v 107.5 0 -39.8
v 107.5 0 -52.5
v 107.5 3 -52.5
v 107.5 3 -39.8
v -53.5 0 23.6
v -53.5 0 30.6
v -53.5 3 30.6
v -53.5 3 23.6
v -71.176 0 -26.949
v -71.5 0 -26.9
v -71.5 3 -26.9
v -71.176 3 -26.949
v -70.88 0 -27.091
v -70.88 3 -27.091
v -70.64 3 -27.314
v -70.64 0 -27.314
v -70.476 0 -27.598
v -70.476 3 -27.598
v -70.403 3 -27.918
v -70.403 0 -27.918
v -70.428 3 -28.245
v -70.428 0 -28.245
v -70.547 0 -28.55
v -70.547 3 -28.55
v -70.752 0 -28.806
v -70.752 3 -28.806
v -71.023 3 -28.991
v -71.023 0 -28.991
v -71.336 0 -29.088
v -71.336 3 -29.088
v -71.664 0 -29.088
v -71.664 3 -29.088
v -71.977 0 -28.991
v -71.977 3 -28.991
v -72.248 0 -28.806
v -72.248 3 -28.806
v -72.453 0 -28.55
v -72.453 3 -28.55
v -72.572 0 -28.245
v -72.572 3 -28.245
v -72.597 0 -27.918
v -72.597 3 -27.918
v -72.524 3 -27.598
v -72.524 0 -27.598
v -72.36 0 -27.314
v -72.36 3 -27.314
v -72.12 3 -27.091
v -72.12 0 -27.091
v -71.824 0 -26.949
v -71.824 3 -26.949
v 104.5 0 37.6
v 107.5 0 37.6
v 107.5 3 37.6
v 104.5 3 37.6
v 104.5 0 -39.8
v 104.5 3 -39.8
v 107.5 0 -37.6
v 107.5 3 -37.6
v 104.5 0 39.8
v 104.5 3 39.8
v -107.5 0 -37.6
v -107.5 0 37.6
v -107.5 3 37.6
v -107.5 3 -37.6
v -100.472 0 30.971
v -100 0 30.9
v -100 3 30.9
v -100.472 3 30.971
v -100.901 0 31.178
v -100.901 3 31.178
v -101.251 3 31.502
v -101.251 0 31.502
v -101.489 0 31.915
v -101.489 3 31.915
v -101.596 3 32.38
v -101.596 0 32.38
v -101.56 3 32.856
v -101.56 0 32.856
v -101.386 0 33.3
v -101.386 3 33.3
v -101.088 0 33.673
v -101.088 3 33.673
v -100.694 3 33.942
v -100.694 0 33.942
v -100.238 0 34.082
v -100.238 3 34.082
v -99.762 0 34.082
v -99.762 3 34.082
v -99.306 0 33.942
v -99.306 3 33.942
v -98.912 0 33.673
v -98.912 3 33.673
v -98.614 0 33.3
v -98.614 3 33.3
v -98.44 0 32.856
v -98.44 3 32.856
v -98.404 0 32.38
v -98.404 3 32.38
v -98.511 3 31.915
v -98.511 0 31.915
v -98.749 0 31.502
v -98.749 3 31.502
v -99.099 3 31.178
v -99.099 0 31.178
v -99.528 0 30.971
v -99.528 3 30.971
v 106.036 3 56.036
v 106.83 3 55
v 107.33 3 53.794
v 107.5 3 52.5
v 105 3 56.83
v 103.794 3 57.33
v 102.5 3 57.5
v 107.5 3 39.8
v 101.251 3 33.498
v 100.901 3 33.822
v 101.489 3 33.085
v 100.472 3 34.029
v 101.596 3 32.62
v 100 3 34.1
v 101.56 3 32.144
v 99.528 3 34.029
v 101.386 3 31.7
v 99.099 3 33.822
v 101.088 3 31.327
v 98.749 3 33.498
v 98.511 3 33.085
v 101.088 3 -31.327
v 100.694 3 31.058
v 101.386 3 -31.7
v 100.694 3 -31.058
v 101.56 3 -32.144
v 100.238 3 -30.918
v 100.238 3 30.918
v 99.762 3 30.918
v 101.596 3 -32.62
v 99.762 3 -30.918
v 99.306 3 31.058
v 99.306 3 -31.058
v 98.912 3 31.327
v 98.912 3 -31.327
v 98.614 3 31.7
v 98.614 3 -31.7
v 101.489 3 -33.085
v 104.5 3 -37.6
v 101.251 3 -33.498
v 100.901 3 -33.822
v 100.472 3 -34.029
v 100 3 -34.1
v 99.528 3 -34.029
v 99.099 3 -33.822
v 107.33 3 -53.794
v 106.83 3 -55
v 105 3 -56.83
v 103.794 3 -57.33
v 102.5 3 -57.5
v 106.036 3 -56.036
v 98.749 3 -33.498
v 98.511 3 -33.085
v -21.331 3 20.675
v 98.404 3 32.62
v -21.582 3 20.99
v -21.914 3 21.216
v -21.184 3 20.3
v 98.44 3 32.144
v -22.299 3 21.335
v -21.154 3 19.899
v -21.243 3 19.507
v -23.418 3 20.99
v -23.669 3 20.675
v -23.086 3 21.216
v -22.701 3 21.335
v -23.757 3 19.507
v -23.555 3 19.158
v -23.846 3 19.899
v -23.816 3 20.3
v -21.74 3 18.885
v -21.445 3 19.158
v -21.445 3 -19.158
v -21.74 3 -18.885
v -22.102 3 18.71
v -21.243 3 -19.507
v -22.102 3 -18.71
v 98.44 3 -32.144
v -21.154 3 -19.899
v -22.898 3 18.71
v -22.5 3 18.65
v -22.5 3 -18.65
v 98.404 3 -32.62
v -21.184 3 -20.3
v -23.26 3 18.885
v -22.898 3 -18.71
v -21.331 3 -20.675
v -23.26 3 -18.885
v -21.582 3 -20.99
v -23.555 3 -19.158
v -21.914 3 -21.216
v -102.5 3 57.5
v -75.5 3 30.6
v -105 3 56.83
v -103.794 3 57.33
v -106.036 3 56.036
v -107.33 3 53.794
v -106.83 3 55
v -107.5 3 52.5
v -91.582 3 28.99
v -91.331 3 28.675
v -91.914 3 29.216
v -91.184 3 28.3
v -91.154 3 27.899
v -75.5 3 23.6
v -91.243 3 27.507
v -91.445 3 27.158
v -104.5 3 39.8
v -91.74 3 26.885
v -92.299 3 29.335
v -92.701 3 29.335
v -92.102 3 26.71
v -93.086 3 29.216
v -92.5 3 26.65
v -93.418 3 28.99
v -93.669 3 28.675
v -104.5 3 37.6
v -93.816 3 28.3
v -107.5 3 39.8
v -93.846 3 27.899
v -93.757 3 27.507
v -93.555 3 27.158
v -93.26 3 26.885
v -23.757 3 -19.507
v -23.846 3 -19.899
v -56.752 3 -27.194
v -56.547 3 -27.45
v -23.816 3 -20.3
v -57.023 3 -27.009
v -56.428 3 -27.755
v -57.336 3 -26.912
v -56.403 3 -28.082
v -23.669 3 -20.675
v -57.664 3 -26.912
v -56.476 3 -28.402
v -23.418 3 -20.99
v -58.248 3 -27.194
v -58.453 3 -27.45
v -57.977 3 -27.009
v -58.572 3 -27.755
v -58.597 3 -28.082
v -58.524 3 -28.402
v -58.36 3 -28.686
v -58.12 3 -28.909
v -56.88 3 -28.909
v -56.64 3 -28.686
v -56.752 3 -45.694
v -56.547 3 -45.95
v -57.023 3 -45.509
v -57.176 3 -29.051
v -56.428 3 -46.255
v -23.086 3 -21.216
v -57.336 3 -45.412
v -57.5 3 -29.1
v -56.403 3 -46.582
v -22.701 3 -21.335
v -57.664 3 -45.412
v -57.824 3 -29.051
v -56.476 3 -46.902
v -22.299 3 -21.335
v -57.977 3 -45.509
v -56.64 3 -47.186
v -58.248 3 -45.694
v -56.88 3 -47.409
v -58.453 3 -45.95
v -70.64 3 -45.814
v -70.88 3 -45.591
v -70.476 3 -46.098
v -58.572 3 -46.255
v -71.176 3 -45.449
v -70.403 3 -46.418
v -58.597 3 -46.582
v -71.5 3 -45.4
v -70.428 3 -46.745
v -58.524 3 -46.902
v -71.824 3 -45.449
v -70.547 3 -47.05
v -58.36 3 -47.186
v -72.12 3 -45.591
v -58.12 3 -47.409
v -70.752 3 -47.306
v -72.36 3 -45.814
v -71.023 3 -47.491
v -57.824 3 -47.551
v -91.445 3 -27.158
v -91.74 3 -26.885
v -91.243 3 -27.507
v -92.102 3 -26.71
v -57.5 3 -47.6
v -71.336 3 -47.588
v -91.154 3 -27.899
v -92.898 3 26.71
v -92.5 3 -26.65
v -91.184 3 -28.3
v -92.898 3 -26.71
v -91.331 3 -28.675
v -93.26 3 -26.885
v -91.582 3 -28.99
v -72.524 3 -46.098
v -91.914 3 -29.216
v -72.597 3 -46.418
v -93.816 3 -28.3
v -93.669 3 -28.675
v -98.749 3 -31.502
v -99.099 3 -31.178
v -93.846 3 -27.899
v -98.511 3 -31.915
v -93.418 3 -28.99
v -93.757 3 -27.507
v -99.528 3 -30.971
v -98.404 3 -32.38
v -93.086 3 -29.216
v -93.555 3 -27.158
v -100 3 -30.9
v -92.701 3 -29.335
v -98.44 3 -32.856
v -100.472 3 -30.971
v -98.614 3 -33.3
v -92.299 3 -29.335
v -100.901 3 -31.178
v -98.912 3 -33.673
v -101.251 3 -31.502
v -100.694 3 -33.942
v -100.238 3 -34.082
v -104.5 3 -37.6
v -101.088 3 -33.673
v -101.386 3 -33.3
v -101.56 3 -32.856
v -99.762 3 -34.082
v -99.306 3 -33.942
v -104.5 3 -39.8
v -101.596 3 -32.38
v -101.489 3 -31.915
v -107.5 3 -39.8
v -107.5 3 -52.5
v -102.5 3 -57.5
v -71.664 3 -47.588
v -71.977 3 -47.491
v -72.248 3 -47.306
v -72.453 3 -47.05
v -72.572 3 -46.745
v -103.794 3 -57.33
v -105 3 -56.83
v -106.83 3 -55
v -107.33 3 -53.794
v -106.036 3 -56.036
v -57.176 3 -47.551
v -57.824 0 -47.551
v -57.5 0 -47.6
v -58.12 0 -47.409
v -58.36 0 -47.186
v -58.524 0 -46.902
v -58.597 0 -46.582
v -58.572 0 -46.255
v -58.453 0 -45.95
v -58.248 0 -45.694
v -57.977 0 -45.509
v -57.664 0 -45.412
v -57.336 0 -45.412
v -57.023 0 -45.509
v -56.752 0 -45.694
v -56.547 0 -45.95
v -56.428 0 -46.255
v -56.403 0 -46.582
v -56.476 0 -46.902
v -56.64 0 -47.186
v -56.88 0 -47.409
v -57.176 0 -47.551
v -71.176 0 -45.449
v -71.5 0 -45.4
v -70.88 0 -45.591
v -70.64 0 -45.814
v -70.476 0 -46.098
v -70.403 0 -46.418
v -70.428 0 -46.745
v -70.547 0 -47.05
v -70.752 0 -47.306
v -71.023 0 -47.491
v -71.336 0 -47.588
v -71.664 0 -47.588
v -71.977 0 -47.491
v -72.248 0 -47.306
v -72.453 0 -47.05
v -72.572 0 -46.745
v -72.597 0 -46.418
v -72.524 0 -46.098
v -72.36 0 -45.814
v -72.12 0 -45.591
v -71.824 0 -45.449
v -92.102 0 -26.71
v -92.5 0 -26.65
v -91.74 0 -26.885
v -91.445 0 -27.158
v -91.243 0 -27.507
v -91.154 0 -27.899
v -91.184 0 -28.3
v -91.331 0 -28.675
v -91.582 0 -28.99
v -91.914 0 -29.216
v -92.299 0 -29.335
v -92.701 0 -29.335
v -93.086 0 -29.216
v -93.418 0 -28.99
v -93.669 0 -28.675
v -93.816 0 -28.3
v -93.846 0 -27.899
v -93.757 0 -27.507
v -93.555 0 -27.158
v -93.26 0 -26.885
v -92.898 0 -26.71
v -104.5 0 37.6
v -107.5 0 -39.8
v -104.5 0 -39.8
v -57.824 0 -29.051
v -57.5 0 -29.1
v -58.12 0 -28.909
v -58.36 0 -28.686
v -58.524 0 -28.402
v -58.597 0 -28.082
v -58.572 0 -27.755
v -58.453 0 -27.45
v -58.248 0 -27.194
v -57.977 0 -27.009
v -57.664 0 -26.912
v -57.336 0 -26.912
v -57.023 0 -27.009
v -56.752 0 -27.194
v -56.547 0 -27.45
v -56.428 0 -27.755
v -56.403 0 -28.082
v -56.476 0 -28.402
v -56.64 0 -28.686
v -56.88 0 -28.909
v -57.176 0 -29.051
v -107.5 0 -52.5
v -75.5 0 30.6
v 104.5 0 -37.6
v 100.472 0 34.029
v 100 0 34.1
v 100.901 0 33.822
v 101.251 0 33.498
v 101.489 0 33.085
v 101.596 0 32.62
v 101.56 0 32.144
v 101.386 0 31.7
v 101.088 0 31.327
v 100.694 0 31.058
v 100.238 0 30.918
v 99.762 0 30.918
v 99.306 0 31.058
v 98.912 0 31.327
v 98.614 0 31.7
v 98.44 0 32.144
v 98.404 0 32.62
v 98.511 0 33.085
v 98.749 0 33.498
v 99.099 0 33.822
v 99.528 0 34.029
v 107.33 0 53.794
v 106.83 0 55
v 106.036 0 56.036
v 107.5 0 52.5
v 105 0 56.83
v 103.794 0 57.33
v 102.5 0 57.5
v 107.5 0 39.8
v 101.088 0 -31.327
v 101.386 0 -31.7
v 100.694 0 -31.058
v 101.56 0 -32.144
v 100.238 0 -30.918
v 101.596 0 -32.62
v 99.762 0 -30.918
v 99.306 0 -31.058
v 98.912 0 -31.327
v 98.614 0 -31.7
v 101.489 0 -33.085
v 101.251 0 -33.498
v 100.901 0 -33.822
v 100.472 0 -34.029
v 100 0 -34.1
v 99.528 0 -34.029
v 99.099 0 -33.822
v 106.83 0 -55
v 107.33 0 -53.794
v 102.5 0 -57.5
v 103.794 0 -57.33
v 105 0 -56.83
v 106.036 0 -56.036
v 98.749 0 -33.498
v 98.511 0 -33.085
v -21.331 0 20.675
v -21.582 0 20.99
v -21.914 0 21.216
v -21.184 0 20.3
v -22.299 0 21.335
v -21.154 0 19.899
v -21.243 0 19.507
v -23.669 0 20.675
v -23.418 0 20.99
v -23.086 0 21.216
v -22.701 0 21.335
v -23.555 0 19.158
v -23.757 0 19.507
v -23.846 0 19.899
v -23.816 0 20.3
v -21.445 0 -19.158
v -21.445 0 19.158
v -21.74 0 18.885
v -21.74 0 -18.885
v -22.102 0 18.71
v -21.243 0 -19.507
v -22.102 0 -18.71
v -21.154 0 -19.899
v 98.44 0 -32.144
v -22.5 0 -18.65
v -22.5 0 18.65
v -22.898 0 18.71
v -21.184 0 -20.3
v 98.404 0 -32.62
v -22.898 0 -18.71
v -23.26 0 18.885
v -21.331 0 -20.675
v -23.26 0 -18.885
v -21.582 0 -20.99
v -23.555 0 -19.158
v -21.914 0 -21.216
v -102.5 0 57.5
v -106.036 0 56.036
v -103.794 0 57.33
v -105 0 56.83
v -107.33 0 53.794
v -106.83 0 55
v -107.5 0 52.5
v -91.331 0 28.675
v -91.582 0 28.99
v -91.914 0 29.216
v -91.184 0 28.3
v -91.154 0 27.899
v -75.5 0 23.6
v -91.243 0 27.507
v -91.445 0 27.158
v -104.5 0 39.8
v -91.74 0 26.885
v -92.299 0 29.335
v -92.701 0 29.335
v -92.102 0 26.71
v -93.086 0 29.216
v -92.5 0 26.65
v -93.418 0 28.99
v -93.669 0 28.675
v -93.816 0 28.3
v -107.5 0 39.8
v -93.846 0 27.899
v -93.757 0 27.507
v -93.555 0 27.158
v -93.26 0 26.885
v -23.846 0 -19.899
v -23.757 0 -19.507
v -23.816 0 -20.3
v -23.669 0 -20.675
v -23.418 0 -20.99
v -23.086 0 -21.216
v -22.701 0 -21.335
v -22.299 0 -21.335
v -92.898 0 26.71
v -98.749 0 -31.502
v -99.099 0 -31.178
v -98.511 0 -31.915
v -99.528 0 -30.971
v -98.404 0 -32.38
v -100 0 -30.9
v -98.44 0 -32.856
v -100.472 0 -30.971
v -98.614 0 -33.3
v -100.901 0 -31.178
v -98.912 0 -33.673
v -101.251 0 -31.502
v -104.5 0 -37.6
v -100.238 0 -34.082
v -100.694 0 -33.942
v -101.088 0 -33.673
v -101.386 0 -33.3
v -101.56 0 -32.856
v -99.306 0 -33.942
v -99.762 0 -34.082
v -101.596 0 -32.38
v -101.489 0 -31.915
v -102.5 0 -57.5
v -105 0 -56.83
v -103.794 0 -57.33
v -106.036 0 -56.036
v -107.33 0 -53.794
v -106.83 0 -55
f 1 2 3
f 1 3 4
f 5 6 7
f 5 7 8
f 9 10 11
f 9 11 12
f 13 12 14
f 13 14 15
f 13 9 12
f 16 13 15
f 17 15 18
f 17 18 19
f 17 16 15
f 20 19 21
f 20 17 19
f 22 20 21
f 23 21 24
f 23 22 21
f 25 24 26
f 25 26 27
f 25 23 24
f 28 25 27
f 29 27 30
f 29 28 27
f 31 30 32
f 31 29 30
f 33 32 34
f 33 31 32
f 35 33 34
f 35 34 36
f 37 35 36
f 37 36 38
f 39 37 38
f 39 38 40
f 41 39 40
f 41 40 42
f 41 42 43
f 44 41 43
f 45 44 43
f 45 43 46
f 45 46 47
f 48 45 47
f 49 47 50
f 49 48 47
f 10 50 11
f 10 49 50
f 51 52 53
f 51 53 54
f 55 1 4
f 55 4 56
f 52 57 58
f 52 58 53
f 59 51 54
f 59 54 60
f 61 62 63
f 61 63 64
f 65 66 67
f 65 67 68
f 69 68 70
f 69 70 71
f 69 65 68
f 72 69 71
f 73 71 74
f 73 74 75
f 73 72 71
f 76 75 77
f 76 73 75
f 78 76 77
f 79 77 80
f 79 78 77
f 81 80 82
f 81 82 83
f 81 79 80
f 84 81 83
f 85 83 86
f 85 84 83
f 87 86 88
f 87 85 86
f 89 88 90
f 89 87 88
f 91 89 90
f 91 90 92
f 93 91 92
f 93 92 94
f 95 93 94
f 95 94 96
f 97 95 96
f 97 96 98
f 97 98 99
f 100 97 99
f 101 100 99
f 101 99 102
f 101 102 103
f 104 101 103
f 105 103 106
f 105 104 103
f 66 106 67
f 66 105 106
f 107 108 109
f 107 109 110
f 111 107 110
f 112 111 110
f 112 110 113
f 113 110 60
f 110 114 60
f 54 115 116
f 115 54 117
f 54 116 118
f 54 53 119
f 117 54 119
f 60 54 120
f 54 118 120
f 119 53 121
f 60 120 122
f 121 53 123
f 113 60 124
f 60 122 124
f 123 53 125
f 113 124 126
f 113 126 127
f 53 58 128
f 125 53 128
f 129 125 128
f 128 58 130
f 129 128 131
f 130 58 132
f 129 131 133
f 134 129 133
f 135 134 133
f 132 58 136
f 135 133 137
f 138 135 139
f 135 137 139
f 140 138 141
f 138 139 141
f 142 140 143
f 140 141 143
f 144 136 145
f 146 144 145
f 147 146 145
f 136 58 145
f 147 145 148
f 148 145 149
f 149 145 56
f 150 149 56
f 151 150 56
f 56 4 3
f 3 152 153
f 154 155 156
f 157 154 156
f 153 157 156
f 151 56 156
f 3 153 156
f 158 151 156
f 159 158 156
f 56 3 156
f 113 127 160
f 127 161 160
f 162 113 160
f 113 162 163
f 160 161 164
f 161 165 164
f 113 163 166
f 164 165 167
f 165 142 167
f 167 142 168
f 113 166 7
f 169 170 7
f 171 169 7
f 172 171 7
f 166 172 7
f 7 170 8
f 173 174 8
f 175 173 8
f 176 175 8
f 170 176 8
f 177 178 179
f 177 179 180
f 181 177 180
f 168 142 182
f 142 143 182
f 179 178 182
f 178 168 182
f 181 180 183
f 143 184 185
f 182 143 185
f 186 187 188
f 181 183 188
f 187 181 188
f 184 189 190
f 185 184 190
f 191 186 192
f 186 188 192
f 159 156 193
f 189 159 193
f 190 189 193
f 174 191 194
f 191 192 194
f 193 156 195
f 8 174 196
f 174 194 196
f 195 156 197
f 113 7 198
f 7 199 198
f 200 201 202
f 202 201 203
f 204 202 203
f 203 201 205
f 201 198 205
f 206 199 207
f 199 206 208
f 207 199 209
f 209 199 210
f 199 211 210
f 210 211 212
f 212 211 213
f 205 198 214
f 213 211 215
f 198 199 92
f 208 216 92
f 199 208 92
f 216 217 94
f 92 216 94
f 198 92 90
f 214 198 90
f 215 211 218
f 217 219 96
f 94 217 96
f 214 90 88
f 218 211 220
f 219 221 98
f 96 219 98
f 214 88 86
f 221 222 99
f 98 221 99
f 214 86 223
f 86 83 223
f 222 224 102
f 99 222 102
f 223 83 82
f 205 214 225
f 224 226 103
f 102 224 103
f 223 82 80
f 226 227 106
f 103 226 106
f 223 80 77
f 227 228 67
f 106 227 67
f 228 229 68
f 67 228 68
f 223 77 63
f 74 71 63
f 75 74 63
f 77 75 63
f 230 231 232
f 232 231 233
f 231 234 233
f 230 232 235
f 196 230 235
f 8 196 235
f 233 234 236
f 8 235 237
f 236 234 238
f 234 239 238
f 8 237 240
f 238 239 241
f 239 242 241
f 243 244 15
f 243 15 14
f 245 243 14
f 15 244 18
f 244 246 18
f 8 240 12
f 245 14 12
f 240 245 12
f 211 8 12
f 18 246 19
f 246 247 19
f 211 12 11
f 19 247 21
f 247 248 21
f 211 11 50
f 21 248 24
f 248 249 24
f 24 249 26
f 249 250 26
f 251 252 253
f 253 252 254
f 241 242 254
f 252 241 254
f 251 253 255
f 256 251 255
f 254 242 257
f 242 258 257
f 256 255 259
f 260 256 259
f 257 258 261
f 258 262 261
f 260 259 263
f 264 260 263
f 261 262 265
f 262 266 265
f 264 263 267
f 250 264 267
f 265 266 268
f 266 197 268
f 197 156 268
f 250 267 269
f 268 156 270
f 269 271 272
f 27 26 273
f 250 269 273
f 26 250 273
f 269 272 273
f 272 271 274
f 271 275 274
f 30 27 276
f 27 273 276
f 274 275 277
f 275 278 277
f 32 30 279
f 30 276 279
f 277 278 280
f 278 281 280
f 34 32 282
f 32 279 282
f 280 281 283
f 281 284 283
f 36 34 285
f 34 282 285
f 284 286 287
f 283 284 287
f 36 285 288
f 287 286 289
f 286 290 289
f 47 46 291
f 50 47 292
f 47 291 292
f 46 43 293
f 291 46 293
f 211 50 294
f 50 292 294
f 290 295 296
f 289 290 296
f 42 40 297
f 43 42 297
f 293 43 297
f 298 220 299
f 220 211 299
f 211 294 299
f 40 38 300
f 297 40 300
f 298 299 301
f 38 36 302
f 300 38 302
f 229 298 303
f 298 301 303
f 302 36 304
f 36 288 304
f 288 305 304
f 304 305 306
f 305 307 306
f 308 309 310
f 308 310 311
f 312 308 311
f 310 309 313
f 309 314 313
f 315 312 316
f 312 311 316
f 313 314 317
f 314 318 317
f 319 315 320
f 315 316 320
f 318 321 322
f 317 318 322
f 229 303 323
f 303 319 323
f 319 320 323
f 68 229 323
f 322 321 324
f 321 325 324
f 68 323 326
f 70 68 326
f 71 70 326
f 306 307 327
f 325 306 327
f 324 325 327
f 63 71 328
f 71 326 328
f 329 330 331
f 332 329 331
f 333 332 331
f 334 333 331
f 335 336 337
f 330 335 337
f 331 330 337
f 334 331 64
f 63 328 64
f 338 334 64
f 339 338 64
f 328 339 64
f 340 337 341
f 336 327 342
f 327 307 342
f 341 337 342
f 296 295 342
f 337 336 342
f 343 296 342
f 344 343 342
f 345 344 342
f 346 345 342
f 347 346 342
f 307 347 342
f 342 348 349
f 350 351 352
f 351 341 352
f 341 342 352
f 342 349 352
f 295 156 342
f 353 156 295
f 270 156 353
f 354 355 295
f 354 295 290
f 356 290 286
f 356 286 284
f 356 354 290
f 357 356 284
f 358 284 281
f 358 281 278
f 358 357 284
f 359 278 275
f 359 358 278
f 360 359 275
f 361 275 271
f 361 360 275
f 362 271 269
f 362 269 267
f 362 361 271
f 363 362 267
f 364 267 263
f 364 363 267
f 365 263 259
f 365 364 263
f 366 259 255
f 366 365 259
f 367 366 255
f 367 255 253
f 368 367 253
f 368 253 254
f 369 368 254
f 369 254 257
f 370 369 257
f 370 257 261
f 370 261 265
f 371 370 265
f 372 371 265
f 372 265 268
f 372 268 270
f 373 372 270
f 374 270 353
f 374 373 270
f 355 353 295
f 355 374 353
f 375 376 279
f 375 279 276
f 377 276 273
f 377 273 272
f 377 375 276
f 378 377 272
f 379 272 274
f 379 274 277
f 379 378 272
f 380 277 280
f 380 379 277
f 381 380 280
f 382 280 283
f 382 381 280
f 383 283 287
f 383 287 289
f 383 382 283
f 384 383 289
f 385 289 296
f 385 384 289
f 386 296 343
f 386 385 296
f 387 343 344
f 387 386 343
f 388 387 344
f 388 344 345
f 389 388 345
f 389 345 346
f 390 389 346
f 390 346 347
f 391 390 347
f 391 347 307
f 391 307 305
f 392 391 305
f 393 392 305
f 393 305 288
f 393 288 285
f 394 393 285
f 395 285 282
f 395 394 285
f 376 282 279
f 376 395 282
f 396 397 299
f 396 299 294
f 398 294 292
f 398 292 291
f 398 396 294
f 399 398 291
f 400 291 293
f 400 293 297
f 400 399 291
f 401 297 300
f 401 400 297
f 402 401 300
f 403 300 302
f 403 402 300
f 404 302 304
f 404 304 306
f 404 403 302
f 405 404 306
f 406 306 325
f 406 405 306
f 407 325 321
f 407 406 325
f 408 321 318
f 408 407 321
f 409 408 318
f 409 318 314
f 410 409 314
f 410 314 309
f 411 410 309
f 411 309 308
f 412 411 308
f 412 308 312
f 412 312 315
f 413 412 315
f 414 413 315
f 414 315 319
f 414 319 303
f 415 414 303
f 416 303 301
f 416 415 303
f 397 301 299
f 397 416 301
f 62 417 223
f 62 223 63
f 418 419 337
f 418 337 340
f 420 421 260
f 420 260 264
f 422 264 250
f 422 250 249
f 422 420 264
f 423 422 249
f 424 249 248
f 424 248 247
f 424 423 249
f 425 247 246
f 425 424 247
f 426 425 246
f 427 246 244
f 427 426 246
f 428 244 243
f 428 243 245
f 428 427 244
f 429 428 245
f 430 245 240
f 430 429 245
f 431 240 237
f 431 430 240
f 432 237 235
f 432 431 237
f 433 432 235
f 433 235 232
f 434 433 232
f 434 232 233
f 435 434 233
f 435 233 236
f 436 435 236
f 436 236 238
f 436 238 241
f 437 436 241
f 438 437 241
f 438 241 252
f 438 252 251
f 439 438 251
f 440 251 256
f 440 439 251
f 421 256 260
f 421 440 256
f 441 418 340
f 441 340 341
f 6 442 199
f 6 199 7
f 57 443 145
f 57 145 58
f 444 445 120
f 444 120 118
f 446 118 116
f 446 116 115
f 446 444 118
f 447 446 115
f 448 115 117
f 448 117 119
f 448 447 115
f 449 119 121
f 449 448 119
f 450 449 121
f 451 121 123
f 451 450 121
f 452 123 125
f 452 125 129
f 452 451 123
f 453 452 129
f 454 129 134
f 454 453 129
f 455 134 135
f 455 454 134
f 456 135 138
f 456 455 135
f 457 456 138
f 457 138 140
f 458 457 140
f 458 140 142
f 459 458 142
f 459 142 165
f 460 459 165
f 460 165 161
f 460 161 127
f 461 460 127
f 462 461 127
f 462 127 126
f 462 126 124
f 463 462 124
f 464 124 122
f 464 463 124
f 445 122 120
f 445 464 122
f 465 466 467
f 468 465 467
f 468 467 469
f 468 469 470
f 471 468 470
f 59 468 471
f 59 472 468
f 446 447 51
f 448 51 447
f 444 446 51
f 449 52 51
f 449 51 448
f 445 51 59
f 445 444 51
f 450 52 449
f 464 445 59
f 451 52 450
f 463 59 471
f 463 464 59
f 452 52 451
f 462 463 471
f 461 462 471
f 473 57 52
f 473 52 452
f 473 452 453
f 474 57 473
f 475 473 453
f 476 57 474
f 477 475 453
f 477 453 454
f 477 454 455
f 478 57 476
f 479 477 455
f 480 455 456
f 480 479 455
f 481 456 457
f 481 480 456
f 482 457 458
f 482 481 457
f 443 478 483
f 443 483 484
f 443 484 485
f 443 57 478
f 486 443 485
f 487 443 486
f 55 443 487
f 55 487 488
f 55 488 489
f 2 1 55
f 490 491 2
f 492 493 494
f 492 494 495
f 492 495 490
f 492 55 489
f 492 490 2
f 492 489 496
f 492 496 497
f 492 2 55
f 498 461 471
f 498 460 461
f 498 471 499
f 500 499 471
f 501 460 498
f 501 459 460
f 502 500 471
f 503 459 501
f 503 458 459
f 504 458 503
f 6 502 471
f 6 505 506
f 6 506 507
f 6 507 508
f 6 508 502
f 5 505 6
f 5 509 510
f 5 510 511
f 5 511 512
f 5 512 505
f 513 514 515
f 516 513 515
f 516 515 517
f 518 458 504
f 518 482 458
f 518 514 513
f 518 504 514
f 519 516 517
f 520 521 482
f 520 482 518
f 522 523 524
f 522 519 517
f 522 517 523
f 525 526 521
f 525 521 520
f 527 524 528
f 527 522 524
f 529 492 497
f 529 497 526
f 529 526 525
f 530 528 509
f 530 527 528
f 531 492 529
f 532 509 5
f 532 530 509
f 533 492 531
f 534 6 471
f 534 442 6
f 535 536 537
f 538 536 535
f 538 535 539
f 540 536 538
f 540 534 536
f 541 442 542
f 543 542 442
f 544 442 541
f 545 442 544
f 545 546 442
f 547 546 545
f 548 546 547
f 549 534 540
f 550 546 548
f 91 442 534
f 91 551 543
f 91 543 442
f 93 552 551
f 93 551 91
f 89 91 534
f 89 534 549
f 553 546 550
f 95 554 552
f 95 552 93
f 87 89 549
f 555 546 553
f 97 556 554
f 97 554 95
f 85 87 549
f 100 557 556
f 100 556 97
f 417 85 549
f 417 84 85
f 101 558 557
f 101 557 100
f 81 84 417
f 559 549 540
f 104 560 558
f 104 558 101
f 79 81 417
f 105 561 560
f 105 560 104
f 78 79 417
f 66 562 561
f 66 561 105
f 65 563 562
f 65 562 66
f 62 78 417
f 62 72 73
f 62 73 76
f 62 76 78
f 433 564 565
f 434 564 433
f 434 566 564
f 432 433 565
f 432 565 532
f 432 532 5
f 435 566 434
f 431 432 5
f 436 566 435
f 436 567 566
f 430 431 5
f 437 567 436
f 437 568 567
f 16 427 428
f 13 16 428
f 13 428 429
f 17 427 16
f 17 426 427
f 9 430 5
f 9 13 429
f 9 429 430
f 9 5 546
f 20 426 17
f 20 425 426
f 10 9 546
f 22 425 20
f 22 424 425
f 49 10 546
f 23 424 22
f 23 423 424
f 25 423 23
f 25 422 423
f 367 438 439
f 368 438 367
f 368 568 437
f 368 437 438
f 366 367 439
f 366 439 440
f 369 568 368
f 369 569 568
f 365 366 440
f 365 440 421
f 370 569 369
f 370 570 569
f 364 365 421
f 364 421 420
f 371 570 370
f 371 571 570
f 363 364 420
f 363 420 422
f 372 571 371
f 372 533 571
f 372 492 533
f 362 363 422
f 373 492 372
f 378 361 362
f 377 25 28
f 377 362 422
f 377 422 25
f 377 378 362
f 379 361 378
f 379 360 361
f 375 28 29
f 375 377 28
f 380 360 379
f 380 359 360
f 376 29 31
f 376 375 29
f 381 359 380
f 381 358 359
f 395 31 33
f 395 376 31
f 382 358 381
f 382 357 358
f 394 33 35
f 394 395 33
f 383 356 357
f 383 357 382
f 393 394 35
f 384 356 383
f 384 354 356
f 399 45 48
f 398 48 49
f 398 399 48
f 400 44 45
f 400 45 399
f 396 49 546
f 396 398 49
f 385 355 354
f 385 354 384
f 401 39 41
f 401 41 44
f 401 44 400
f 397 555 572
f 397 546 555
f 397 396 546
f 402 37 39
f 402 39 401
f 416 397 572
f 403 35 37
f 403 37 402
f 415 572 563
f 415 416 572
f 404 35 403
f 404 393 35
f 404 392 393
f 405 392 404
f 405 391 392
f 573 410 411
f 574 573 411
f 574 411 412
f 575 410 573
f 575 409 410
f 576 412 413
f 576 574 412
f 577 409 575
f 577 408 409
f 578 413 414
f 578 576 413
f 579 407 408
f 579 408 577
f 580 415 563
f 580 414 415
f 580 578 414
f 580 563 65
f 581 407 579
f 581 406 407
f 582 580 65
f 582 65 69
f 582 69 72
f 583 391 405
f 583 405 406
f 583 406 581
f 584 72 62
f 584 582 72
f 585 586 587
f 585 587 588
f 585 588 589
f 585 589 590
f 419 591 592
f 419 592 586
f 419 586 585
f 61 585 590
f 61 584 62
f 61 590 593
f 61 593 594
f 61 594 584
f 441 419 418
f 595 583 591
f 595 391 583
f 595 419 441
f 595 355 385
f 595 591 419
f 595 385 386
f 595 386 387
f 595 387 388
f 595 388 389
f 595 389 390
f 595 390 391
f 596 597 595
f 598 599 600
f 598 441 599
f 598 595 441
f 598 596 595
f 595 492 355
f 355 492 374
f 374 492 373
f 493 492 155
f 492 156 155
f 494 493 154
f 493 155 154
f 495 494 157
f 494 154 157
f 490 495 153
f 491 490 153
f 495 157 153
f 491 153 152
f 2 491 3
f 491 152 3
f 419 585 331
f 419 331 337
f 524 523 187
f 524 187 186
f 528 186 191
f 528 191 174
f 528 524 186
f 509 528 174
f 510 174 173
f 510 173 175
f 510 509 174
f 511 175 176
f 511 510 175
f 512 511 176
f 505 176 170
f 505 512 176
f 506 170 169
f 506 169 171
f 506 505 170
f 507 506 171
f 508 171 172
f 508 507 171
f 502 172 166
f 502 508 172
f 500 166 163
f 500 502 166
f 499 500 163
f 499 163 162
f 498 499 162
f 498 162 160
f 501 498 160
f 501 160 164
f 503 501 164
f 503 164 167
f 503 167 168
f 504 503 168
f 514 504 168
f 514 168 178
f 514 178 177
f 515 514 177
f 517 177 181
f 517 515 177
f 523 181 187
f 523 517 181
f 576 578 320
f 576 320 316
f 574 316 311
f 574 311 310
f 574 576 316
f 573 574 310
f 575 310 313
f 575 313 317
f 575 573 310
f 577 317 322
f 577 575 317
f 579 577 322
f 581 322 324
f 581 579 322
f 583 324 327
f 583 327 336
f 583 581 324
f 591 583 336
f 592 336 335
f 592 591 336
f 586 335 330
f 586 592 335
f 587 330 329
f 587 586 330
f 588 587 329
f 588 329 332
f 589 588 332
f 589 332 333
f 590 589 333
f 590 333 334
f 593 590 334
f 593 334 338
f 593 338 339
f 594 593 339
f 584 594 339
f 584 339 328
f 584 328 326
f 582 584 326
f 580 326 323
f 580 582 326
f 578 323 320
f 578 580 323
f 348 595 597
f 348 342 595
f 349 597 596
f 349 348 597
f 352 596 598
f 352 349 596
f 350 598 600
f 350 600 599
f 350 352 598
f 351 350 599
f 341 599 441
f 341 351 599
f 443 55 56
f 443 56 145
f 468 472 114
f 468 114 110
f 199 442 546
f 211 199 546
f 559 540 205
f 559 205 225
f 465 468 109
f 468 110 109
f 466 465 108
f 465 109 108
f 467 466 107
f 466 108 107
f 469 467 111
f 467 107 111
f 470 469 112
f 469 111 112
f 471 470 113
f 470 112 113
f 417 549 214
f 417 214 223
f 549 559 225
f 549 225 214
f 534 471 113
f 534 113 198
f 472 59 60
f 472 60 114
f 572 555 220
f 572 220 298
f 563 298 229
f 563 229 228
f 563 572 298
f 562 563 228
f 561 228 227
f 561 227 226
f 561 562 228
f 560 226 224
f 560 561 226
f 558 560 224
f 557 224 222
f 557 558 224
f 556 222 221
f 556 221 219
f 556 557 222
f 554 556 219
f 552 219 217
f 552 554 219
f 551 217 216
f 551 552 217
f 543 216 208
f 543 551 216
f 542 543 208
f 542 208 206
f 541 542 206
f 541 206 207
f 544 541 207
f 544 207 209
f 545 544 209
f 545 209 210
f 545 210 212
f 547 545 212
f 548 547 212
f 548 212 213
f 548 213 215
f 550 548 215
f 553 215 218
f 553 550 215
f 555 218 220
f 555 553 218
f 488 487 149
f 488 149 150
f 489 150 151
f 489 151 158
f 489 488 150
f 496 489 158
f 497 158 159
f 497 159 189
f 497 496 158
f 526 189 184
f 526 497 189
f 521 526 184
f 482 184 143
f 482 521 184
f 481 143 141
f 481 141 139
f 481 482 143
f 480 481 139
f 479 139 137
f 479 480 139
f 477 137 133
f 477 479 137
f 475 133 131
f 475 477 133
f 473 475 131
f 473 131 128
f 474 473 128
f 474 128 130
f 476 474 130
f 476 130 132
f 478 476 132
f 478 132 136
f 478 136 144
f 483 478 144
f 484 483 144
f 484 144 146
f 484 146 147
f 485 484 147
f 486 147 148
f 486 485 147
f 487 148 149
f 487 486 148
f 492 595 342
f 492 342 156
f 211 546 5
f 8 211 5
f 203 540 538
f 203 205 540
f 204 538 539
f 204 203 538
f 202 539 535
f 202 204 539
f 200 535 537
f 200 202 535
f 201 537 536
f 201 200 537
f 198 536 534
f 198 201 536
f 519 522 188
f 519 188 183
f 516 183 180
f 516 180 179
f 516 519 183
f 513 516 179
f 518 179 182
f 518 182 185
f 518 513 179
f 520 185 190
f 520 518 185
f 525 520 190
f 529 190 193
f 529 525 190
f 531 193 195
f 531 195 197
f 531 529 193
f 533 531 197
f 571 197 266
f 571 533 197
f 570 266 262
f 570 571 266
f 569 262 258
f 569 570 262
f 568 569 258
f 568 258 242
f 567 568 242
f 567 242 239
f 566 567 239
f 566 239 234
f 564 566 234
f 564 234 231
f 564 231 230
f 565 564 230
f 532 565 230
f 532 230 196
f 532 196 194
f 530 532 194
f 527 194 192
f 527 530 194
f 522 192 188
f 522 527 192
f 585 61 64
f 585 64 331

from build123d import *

# Parameters (mm, degrees)
SKETCH1_R           = 1.35
SKETCH1_R_2         = 1.6
SKETCH1_R_3         = 1.1
SKETCH1_W           = 22
SKETCH1_H           = 7
BOSS_EXTRUDE1_DEPTH = 3
FILLET1_R           = 5


with BuildPart() as part:
    # Sketch1 → Boss-Extrude1 (new body)
    with BuildSketch(Plane(origin=(0, 0, 0), x_dir=(1, 0, 0), z_dir=(0, 1, 0))):
        Polygon((-107.5, 57.5), (107.5, 57.5), (107.5, 39.8), (104.5, 39.8), (104.5, 37.6), (107.5, 37.6), (107.5, -37.6), (104.5, -37.6), (104.5, -39.8), (107.5, -39.8), (107.5, -57.5), (-107.5, -57.5), (-107.5, -39.8), (-104.5, -39.8), (-104.5, -37.6), (-107.5, -37.6), (-107.5, 37.6), (-104.5, 37.6), (-104.5, 39.8), (-107.5, 39.8), align=None)
        with Locations(Location((-92.5, 28, 0), (0, 0, 270))):
            Circle(SKETCH1_R, mode=Mode.SUBTRACT)
        with Locations(Location((-22.5, 20, 0), (0, 0, 270))):
            Circle(SKETCH1_R, mode=Mode.SUBTRACT)
        with Locations(Location((-92.5, -28, 0), (0, 0, 90))):
            Circle(SKETCH1_R, mode=Mode.SUBTRACT)
        with Locations(Location((-22.5, -20, 0), (0, 0, 90))):
            Circle(SKETCH1_R, mode=Mode.SUBTRACT)
        with Locations(Location((-100, 32.5, 0), (0, 0, 270))):
            Circle(SKETCH1_R_2, mode=Mode.SUBTRACT)
        with Locations(Location((100, 32.5, 0), (0, 0, 90))):
            Circle(SKETCH1_R_2, mode=Mode.SUBTRACT)
        with Locations(Location((100, -32.5, 0), (0, 0, 270))):
            Circle(SKETCH1_R_2, mode=Mode.SUBTRACT)
        with Locations(Location((-100, -32.5, 0), (0, 0, 90))):
            Circle(SKETCH1_R_2, mode=Mode.SUBTRACT)
        with Locations(Location((-71.5, 46.5, 0), (0, 0, 270))):
            Circle(SKETCH1_R_3, mode=Mode.SUBTRACT)
        with Locations(Location((-71.5, 28, 0), (0, 0, 270))):
            Circle(SKETCH1_R_3, mode=Mode.SUBTRACT)
        with Locations(Location((-57.5, 46.5, 0), (0, 0, 90))):
            Circle(SKETCH1_R_3, mode=Mode.SUBTRACT)
        with Locations(Location((-57.5, 28, 0), (0, 0, 90))):
            Circle(SKETCH1_R_3, mode=Mode.SUBTRACT)
        with Locations((-64.5, -27.1)):
            Rectangle(SKETCH1_W, SKETCH1_H, mode=Mode.SUBTRACT)
    extrude(amount=BOSS_EXTRUDE1_DEPTH)

    # Fillet1
    fillet1_edges = [part.edges().sort_by_distance(p)[0] for p in [
        (107.5, 1.5, 57.5),
        (-107.5, 1.5, 57.5),
        (-107.5, 1.5, -57.5),
        (107.5, 1.5, -57.5),
    ]]
    fillet(fillet1_edges, radius=FILLET1_R)


solid = part.part
